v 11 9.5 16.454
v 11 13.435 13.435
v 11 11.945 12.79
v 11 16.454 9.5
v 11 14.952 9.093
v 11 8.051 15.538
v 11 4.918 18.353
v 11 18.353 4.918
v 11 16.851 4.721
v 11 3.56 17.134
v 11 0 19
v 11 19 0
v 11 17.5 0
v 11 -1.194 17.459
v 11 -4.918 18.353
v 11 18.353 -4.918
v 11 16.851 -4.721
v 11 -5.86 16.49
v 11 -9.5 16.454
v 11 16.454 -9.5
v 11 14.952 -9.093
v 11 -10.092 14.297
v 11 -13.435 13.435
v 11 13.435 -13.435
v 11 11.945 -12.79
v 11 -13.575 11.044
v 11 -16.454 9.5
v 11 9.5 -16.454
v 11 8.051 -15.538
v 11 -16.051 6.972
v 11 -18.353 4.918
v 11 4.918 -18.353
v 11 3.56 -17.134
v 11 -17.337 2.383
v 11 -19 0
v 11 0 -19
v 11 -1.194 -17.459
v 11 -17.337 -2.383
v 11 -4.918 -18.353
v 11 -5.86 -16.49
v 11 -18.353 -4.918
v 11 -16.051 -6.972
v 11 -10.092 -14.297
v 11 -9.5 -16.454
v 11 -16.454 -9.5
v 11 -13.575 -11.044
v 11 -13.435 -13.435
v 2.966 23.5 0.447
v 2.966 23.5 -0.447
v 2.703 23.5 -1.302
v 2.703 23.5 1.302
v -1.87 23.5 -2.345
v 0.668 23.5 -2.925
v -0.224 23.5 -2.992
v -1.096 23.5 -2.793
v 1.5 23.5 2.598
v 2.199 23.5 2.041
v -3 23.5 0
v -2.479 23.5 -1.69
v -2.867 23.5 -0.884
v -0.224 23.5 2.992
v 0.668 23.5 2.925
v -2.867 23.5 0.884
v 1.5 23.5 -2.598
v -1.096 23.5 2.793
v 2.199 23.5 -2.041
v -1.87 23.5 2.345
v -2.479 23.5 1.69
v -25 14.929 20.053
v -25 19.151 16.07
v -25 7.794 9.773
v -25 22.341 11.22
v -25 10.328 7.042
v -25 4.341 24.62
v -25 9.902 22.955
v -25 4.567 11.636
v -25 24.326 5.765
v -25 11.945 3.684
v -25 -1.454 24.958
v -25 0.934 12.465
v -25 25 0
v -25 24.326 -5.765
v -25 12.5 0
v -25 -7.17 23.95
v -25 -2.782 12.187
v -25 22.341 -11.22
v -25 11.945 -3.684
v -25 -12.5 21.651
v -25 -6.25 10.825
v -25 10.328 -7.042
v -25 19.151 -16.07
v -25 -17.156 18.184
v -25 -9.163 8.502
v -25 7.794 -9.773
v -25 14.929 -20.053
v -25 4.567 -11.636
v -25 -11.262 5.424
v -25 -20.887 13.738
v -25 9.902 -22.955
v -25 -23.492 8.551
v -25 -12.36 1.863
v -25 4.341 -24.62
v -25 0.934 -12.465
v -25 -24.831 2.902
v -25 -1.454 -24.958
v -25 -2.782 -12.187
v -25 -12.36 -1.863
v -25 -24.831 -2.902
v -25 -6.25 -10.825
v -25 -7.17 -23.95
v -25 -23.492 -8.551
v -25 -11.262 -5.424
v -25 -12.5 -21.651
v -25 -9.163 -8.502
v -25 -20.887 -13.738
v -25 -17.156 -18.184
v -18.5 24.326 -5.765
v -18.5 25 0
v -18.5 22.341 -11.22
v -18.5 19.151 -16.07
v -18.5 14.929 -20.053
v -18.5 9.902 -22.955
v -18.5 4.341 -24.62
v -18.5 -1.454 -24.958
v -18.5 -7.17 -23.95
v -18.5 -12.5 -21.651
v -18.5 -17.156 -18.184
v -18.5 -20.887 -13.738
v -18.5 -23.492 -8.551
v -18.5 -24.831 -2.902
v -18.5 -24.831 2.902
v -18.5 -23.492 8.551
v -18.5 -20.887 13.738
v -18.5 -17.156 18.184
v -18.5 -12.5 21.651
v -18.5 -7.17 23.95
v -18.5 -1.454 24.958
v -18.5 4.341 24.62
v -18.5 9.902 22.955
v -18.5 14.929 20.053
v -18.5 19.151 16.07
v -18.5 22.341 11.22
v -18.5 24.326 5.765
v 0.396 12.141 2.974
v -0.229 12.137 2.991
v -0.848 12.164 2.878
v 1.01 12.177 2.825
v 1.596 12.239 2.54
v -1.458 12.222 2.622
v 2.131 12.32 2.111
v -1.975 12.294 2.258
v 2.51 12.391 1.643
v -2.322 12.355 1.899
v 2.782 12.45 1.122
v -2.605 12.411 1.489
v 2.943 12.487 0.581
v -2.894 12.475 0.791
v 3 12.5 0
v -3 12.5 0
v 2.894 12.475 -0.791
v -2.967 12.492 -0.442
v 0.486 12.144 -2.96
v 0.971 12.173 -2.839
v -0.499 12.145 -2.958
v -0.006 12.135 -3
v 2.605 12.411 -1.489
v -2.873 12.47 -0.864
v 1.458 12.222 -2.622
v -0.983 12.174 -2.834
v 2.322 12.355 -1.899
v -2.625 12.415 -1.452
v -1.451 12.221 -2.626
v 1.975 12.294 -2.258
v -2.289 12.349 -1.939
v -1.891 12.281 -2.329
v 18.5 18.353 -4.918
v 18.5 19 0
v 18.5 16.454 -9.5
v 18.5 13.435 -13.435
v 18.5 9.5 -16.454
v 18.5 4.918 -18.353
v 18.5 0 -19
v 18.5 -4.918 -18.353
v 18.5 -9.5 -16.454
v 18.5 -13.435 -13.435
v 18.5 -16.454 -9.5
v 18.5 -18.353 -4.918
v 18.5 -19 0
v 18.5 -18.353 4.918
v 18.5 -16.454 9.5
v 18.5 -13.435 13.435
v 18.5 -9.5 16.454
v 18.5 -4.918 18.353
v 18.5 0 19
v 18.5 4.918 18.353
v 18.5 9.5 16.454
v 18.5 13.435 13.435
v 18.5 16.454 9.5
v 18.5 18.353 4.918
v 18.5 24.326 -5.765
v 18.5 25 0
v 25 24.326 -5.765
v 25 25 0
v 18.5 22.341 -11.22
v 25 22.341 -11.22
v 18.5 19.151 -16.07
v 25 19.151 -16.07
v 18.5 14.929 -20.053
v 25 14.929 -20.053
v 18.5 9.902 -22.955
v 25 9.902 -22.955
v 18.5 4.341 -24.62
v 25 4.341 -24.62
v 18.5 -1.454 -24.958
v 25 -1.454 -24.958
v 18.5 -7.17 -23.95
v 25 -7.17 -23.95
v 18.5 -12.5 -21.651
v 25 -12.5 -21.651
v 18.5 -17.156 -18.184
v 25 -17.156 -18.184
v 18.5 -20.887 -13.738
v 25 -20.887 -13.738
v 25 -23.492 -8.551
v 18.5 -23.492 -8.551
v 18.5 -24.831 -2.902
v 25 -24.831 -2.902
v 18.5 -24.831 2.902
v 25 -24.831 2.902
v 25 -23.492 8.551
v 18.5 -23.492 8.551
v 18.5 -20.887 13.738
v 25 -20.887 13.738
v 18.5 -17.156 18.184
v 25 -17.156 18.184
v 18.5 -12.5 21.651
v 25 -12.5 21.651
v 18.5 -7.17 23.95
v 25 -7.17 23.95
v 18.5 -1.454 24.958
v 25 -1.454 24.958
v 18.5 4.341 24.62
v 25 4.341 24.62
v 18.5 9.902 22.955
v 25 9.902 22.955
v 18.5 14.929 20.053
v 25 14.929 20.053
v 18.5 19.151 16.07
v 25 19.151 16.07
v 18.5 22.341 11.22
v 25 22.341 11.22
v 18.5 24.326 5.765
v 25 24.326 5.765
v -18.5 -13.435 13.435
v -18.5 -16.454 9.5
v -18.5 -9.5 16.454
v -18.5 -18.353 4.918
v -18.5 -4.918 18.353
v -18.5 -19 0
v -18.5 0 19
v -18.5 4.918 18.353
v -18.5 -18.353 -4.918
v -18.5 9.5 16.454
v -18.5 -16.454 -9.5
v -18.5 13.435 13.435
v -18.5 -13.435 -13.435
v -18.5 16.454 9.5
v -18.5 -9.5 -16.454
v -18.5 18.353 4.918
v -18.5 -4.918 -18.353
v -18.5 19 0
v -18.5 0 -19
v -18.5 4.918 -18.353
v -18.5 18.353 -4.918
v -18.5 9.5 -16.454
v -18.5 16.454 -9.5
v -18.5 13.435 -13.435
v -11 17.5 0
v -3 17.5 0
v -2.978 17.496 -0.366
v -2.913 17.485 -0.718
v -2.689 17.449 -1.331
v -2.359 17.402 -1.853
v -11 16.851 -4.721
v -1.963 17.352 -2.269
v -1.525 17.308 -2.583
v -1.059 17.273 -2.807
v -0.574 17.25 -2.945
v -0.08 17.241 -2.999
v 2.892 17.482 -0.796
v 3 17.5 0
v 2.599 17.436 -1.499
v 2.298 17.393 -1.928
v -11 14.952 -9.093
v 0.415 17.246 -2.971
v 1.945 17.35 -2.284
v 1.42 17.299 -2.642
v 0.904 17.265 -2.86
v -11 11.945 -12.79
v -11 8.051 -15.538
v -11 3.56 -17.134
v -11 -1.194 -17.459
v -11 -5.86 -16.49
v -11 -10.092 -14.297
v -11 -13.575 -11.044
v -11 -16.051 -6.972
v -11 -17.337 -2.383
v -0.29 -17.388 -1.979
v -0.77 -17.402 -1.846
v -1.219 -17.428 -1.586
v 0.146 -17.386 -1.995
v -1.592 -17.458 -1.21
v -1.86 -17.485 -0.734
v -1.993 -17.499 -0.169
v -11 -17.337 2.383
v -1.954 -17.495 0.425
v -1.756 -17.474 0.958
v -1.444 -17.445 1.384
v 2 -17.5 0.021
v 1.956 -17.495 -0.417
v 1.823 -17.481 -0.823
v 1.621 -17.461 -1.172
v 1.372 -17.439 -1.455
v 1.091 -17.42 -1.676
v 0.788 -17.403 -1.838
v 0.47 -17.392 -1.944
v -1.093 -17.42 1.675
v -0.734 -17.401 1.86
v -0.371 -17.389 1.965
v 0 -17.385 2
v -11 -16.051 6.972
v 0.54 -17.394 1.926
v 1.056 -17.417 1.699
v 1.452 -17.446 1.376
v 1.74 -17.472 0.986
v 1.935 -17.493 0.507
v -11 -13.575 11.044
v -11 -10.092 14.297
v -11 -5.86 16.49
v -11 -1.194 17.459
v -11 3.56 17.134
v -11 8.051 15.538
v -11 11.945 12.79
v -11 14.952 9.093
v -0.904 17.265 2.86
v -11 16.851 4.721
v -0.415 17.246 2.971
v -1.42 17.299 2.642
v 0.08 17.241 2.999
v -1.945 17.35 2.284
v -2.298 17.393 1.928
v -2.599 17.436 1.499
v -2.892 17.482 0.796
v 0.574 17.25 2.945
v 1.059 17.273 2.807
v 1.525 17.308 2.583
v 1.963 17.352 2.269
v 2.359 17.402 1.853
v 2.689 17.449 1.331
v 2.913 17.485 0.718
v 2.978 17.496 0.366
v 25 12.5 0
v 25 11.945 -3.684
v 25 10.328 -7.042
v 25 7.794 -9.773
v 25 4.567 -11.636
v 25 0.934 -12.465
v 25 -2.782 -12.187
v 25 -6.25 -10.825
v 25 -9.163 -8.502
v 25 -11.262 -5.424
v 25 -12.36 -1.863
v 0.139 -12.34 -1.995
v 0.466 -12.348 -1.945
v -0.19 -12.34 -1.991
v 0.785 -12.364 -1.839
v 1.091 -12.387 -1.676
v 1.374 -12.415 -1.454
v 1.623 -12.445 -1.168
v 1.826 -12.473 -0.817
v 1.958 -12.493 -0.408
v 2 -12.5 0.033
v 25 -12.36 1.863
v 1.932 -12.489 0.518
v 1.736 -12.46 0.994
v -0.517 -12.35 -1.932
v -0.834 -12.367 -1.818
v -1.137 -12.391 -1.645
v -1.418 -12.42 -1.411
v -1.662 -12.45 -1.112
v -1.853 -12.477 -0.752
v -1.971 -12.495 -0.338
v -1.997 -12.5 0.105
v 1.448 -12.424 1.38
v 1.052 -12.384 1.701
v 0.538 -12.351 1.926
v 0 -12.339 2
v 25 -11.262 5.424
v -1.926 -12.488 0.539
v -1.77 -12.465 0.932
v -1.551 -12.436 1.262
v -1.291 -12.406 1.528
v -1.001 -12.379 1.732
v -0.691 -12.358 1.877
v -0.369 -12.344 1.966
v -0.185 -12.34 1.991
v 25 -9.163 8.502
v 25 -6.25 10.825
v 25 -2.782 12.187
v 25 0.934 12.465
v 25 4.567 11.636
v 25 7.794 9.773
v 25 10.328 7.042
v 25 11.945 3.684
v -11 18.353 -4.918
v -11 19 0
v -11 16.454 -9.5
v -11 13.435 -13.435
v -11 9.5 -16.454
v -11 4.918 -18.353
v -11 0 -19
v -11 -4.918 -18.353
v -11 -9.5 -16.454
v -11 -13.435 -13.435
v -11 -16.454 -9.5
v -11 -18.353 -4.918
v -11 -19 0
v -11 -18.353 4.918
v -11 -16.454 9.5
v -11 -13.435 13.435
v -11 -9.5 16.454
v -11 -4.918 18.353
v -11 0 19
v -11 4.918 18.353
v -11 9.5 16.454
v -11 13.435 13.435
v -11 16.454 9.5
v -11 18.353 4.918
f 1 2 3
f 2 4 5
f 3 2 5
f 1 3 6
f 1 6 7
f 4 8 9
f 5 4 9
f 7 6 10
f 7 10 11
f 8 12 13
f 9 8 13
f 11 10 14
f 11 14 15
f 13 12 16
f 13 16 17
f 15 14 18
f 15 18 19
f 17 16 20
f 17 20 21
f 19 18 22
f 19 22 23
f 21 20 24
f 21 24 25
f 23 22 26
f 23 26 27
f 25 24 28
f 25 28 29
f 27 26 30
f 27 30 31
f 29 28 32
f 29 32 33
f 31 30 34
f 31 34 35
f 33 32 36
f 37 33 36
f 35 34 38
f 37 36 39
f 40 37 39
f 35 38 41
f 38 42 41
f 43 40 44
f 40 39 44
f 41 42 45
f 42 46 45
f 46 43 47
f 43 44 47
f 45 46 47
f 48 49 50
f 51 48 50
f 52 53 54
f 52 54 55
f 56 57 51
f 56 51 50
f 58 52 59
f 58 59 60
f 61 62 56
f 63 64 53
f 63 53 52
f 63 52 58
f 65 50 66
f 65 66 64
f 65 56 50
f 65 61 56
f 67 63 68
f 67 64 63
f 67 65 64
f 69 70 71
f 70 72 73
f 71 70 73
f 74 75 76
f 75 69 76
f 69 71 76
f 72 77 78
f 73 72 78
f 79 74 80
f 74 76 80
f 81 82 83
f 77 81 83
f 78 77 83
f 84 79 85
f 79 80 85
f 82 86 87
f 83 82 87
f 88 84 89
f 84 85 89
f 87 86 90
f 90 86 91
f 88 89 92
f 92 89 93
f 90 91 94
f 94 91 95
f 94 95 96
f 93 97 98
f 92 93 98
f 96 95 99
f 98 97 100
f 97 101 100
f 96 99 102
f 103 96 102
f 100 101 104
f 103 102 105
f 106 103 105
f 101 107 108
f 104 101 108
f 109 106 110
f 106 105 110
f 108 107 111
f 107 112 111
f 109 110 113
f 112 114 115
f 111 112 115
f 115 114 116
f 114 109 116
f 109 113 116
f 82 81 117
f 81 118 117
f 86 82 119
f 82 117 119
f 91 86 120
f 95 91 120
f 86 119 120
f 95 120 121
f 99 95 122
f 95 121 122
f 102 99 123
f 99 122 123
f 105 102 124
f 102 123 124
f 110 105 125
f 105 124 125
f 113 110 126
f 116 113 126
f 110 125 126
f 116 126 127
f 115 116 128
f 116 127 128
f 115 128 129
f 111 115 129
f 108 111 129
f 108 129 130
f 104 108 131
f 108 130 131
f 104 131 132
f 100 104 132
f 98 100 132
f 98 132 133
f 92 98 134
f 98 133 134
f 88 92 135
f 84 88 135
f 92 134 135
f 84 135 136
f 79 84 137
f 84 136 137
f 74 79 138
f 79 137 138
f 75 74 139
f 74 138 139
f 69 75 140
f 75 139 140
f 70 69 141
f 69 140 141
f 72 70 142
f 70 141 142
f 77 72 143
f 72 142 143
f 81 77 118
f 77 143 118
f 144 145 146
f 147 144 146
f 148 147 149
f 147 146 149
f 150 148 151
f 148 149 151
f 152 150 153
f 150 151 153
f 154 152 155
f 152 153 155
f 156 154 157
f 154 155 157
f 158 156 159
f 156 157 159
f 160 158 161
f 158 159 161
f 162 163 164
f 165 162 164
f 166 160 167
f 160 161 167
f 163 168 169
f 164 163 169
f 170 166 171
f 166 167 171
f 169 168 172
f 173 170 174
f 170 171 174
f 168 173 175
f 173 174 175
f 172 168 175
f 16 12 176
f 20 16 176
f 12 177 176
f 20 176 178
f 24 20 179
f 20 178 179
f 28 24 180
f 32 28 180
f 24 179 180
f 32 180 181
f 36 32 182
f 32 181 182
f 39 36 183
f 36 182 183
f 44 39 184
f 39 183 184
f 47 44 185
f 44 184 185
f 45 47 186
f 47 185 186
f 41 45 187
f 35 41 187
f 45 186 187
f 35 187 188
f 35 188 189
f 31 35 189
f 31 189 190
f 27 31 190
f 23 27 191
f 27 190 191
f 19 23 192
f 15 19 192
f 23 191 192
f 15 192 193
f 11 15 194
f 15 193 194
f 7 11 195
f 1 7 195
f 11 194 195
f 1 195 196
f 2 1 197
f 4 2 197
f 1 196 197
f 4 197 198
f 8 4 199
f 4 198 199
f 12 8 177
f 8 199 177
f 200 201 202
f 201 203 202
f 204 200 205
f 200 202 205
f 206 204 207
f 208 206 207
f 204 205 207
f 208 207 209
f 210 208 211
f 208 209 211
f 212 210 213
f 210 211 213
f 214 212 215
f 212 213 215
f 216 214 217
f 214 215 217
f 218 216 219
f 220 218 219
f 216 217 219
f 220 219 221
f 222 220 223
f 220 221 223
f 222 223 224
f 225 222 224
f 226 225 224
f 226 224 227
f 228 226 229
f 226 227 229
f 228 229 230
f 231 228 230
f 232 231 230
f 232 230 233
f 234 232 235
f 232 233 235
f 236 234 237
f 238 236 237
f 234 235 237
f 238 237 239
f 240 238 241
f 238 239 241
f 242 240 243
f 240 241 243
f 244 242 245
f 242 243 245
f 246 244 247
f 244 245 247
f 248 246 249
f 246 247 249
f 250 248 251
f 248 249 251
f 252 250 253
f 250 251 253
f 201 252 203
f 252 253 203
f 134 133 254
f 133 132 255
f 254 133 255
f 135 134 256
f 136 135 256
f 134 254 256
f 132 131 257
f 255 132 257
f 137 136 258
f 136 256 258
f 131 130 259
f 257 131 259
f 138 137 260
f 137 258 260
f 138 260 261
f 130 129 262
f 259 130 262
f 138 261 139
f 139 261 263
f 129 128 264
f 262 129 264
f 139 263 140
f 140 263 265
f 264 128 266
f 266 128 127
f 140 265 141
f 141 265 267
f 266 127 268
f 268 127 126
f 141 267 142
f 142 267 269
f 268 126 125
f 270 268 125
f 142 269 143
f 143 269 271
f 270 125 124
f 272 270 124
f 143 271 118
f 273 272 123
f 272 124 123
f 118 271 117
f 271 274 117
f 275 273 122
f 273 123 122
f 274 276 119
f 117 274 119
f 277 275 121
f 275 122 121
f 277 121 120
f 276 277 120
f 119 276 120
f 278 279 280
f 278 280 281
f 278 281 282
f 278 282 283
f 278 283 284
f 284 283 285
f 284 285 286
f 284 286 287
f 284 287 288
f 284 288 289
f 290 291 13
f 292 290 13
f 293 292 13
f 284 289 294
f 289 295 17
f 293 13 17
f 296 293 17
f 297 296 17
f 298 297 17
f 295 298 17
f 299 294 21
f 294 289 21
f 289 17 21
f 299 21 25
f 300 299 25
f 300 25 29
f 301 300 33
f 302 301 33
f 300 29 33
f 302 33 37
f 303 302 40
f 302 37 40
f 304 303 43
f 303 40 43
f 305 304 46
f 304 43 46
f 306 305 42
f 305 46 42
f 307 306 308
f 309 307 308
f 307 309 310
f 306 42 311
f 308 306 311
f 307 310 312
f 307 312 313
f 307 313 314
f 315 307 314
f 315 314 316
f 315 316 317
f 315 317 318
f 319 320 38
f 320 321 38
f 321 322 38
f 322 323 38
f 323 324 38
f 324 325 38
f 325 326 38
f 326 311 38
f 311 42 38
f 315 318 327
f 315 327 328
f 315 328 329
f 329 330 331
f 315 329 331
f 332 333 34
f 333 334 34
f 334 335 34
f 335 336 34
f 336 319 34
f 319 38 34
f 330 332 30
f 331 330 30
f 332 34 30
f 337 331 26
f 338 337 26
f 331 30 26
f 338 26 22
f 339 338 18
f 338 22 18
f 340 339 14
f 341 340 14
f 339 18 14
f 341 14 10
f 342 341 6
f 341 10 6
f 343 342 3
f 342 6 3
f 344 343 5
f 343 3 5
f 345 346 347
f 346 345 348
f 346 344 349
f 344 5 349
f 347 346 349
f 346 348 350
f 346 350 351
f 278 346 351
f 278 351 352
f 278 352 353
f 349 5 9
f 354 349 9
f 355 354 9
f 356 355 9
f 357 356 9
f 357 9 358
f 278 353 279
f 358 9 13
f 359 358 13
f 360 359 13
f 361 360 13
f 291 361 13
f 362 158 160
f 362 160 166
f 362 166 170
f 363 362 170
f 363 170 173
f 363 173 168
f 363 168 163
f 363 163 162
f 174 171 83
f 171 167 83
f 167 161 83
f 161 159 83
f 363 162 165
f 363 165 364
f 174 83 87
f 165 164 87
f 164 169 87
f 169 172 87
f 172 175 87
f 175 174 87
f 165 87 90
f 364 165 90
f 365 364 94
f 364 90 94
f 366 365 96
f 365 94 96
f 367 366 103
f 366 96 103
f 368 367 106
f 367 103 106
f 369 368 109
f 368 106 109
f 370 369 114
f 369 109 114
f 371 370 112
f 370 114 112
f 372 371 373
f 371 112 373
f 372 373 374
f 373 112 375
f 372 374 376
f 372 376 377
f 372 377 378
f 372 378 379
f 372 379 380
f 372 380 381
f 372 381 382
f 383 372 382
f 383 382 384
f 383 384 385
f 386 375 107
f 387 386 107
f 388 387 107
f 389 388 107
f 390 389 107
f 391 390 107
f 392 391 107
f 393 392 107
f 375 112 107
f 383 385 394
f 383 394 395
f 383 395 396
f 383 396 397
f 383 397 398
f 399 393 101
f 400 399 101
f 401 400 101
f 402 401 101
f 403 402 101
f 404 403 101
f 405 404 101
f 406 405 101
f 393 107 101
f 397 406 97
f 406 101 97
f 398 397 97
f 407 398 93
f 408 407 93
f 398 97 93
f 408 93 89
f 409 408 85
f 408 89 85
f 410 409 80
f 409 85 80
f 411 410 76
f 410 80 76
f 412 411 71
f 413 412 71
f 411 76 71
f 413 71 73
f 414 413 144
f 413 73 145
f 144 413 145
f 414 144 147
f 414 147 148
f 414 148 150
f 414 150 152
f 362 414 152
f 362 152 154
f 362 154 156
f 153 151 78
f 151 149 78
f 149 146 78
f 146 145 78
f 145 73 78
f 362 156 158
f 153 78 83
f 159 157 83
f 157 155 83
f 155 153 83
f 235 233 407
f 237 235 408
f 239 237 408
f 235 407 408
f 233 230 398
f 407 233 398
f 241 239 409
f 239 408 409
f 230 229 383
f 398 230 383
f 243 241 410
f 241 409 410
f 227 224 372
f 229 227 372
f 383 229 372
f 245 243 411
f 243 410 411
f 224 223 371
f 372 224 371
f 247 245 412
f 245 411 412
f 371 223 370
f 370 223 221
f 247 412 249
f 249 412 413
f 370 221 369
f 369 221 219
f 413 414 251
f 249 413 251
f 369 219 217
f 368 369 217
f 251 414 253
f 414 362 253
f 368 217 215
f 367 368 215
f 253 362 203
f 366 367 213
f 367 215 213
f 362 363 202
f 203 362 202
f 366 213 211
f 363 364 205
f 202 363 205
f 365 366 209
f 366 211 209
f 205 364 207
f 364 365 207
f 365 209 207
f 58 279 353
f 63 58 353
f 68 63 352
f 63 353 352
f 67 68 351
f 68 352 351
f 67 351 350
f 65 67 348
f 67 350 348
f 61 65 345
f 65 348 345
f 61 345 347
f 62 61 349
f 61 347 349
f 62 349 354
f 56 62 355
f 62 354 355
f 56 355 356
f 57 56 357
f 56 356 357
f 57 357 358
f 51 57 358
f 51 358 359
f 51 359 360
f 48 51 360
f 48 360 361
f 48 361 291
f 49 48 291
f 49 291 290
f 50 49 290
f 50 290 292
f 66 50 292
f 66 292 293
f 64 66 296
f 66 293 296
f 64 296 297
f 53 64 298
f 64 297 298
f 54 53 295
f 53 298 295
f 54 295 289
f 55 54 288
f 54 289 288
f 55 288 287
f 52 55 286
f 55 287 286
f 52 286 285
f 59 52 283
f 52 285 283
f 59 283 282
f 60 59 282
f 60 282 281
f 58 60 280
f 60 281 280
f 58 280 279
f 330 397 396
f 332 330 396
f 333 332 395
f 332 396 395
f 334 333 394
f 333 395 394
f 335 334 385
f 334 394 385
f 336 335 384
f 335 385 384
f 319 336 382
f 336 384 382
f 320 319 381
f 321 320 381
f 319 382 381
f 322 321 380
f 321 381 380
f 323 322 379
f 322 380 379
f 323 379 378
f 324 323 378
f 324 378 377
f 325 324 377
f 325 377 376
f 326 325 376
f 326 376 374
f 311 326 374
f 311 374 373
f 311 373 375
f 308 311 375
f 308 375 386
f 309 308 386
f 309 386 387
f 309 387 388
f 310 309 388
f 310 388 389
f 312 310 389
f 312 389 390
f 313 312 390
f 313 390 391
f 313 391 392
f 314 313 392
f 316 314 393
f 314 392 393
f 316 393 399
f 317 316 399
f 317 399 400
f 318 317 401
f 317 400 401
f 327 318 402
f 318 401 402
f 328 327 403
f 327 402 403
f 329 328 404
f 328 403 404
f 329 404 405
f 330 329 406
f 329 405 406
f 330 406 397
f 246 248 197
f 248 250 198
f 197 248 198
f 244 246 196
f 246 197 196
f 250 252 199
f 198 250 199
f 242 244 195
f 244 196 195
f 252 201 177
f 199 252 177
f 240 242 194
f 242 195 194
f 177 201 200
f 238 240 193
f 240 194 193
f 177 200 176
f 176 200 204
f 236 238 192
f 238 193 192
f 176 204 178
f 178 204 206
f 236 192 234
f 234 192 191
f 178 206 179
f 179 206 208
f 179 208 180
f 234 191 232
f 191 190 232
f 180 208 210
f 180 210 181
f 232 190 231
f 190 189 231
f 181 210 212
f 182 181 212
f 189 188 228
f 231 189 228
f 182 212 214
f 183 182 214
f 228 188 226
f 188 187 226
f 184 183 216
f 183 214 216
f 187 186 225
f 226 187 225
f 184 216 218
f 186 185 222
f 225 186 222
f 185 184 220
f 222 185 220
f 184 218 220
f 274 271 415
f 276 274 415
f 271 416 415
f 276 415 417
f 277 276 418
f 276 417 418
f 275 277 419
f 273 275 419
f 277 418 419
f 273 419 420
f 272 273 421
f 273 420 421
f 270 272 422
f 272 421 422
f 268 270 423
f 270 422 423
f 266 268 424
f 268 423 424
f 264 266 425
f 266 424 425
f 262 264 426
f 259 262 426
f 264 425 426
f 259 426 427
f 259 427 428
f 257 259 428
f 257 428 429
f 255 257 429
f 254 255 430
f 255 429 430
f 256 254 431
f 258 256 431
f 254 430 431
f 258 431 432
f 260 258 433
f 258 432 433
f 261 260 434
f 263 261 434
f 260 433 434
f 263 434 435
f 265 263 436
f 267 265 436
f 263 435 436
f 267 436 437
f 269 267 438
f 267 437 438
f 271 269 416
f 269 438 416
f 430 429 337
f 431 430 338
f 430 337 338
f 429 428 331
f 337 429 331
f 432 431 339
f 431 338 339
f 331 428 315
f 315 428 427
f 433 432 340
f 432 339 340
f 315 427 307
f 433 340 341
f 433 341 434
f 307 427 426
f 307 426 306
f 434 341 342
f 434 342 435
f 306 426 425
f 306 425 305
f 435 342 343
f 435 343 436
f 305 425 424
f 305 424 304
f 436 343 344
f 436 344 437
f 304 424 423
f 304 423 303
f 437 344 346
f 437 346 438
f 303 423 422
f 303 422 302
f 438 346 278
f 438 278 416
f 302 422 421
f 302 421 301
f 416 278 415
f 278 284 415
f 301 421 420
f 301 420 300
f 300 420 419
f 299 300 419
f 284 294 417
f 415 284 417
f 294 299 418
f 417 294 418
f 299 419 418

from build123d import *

# Parameters (mm, degrees)
SKETCH2_R           = 2
CUT_EXTRUDE1_DEPTH  = 42
SKETCH3_R           = 3
BOSS_EXTRUDE1_DEPTH = 23.5
SKETCH20_R          = 12.5
CUT_EXTRUDE2_DEPTH  = 62.237243651


with BuildPart() as part:
    # Sketch1 → Revolve1 (revolve)
    with BuildSketch(Plane.XY):
        Polygon((25, 25), (25, 12.5), (-25, 12.5), (-25, 25), (-18.5, 25), (-18.5, 19), (-11, 19), (-11, 17.5), (11, 17.5), (11, 19), (18.5, 19), (18.5, 25), align=None)
    revolve(axis=Axis((25, 0, 0), (-1, 0, 0)))

    # Sketch2 → Cut-Extrude1 (cut)
    with BuildSketch(Plane(origin=(0, 0, 0), x_dir=(1, 0, 0), z_dir=(0, 1, 0))):
        with Locations(Location((0, 0, 0), (0, 0, 270))):
            Circle(SKETCH2_R)
    extrude(amount=-CUT_EXTRUDE1_DEPTH, mode=Mode.SUBTRACT)

    # Sketch3 → Boss-Extrude1 (add)
    with BuildSketch(Plane(origin=(0, 0, 0), x_dir=(1, 0, 0), z_dir=(0, 1, 0))):
        with Locations(Location((0, 0, 0), (0, 0, 180))):
            Circle(SKETCH3_R)
    extrude(amount=BOSS_EXTRUDE1_DEPTH)

    # Sketch20 → Cut-Extrude2 (cut, through all)
    with BuildSketch(Plane.ZY.offset(25)):
        with Locations(Location((0, 0, 0), (0, 0, 90))):
            Circle(SKETCH20_R)
    extrude(amount=-CUT_EXTRUDE2_DEPTH, mode=Mode.SUBTRACT)


solid = part.part
